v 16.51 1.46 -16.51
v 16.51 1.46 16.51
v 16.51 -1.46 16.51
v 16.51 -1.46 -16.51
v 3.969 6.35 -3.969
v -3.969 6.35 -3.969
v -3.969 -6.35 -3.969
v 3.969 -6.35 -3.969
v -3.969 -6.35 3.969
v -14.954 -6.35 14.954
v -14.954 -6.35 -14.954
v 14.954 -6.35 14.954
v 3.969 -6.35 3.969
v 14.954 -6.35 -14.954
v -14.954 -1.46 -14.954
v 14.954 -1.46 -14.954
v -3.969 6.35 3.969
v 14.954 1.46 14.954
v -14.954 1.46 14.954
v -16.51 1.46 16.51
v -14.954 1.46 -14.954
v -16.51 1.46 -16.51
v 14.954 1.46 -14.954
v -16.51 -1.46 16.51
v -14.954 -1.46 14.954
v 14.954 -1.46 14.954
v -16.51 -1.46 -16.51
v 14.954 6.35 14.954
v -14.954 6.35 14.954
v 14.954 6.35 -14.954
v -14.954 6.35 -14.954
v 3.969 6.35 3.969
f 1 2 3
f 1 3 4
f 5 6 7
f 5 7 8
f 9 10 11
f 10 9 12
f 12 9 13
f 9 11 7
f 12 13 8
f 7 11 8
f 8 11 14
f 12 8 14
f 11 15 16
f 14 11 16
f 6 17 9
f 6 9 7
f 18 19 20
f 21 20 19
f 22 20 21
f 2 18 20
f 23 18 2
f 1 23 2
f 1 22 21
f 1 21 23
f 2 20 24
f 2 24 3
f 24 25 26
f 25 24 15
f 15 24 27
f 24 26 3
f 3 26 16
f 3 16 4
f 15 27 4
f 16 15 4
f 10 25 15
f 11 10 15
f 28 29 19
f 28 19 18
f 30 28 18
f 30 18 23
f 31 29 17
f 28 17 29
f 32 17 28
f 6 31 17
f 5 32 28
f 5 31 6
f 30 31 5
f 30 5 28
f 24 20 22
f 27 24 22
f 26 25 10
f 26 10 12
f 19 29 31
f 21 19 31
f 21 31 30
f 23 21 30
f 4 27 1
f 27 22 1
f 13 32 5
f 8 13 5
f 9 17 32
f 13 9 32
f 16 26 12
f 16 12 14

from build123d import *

# Parameters (mm, degrees)
SKETCH1_W           = 29.9085
SKETCH1_H           = 29.9085
BOSS_EXTRUDE1_DEPTH = 6.35
SKETCH2_W           = 33.02
SKETCH2_H           = 33.02
BOSS_EXTRUDE2_DEPTH = 1.4605
SKETCH4_W           = 7.9375
SKETCH4_H           = 7.9375
CUT_EXTRUDE2_DEPTH  = 13.7


with BuildPart() as part:
    # Sketch1 → Boss-Extrude1 (new body, symmetric)
    with BuildSketch(Plane(origin=(0, 0, 0), x_dir=(1, 0, 0), z_dir=(0, 1, 0))):
        Rectangle(SKETCH1_W, SKETCH1_H)
    extrude(amount=BOSS_EXTRUDE1_DEPTH, both=True)

    # Sketch2 → Boss-Extrude2 (add, symmetric)
    with BuildSketch(Plane(origin=(0, 0, 0), x_dir=(1, 0, 0), z_dir=(0, 1, 0))):
        Rectangle(SKETCH2_W, SKETCH2_H)
    extrude(amount=BOSS_EXTRUDE2_DEPTH, both=True)

    # Sketch4 → Cut-Extrude2 (cut, through all)
    with BuildSketch(Plane(origin=(0, 6.35, 0), x_dir=(1, 0, 0), z_dir=(0, 1, 0))):
        Rectangle(SKETCH4_W, SKETCH4_H)
    extrude(amount=-CUT_EXTRUDE2_DEPTH, mode=Mode.SUBTRACT)


solid = part.part
